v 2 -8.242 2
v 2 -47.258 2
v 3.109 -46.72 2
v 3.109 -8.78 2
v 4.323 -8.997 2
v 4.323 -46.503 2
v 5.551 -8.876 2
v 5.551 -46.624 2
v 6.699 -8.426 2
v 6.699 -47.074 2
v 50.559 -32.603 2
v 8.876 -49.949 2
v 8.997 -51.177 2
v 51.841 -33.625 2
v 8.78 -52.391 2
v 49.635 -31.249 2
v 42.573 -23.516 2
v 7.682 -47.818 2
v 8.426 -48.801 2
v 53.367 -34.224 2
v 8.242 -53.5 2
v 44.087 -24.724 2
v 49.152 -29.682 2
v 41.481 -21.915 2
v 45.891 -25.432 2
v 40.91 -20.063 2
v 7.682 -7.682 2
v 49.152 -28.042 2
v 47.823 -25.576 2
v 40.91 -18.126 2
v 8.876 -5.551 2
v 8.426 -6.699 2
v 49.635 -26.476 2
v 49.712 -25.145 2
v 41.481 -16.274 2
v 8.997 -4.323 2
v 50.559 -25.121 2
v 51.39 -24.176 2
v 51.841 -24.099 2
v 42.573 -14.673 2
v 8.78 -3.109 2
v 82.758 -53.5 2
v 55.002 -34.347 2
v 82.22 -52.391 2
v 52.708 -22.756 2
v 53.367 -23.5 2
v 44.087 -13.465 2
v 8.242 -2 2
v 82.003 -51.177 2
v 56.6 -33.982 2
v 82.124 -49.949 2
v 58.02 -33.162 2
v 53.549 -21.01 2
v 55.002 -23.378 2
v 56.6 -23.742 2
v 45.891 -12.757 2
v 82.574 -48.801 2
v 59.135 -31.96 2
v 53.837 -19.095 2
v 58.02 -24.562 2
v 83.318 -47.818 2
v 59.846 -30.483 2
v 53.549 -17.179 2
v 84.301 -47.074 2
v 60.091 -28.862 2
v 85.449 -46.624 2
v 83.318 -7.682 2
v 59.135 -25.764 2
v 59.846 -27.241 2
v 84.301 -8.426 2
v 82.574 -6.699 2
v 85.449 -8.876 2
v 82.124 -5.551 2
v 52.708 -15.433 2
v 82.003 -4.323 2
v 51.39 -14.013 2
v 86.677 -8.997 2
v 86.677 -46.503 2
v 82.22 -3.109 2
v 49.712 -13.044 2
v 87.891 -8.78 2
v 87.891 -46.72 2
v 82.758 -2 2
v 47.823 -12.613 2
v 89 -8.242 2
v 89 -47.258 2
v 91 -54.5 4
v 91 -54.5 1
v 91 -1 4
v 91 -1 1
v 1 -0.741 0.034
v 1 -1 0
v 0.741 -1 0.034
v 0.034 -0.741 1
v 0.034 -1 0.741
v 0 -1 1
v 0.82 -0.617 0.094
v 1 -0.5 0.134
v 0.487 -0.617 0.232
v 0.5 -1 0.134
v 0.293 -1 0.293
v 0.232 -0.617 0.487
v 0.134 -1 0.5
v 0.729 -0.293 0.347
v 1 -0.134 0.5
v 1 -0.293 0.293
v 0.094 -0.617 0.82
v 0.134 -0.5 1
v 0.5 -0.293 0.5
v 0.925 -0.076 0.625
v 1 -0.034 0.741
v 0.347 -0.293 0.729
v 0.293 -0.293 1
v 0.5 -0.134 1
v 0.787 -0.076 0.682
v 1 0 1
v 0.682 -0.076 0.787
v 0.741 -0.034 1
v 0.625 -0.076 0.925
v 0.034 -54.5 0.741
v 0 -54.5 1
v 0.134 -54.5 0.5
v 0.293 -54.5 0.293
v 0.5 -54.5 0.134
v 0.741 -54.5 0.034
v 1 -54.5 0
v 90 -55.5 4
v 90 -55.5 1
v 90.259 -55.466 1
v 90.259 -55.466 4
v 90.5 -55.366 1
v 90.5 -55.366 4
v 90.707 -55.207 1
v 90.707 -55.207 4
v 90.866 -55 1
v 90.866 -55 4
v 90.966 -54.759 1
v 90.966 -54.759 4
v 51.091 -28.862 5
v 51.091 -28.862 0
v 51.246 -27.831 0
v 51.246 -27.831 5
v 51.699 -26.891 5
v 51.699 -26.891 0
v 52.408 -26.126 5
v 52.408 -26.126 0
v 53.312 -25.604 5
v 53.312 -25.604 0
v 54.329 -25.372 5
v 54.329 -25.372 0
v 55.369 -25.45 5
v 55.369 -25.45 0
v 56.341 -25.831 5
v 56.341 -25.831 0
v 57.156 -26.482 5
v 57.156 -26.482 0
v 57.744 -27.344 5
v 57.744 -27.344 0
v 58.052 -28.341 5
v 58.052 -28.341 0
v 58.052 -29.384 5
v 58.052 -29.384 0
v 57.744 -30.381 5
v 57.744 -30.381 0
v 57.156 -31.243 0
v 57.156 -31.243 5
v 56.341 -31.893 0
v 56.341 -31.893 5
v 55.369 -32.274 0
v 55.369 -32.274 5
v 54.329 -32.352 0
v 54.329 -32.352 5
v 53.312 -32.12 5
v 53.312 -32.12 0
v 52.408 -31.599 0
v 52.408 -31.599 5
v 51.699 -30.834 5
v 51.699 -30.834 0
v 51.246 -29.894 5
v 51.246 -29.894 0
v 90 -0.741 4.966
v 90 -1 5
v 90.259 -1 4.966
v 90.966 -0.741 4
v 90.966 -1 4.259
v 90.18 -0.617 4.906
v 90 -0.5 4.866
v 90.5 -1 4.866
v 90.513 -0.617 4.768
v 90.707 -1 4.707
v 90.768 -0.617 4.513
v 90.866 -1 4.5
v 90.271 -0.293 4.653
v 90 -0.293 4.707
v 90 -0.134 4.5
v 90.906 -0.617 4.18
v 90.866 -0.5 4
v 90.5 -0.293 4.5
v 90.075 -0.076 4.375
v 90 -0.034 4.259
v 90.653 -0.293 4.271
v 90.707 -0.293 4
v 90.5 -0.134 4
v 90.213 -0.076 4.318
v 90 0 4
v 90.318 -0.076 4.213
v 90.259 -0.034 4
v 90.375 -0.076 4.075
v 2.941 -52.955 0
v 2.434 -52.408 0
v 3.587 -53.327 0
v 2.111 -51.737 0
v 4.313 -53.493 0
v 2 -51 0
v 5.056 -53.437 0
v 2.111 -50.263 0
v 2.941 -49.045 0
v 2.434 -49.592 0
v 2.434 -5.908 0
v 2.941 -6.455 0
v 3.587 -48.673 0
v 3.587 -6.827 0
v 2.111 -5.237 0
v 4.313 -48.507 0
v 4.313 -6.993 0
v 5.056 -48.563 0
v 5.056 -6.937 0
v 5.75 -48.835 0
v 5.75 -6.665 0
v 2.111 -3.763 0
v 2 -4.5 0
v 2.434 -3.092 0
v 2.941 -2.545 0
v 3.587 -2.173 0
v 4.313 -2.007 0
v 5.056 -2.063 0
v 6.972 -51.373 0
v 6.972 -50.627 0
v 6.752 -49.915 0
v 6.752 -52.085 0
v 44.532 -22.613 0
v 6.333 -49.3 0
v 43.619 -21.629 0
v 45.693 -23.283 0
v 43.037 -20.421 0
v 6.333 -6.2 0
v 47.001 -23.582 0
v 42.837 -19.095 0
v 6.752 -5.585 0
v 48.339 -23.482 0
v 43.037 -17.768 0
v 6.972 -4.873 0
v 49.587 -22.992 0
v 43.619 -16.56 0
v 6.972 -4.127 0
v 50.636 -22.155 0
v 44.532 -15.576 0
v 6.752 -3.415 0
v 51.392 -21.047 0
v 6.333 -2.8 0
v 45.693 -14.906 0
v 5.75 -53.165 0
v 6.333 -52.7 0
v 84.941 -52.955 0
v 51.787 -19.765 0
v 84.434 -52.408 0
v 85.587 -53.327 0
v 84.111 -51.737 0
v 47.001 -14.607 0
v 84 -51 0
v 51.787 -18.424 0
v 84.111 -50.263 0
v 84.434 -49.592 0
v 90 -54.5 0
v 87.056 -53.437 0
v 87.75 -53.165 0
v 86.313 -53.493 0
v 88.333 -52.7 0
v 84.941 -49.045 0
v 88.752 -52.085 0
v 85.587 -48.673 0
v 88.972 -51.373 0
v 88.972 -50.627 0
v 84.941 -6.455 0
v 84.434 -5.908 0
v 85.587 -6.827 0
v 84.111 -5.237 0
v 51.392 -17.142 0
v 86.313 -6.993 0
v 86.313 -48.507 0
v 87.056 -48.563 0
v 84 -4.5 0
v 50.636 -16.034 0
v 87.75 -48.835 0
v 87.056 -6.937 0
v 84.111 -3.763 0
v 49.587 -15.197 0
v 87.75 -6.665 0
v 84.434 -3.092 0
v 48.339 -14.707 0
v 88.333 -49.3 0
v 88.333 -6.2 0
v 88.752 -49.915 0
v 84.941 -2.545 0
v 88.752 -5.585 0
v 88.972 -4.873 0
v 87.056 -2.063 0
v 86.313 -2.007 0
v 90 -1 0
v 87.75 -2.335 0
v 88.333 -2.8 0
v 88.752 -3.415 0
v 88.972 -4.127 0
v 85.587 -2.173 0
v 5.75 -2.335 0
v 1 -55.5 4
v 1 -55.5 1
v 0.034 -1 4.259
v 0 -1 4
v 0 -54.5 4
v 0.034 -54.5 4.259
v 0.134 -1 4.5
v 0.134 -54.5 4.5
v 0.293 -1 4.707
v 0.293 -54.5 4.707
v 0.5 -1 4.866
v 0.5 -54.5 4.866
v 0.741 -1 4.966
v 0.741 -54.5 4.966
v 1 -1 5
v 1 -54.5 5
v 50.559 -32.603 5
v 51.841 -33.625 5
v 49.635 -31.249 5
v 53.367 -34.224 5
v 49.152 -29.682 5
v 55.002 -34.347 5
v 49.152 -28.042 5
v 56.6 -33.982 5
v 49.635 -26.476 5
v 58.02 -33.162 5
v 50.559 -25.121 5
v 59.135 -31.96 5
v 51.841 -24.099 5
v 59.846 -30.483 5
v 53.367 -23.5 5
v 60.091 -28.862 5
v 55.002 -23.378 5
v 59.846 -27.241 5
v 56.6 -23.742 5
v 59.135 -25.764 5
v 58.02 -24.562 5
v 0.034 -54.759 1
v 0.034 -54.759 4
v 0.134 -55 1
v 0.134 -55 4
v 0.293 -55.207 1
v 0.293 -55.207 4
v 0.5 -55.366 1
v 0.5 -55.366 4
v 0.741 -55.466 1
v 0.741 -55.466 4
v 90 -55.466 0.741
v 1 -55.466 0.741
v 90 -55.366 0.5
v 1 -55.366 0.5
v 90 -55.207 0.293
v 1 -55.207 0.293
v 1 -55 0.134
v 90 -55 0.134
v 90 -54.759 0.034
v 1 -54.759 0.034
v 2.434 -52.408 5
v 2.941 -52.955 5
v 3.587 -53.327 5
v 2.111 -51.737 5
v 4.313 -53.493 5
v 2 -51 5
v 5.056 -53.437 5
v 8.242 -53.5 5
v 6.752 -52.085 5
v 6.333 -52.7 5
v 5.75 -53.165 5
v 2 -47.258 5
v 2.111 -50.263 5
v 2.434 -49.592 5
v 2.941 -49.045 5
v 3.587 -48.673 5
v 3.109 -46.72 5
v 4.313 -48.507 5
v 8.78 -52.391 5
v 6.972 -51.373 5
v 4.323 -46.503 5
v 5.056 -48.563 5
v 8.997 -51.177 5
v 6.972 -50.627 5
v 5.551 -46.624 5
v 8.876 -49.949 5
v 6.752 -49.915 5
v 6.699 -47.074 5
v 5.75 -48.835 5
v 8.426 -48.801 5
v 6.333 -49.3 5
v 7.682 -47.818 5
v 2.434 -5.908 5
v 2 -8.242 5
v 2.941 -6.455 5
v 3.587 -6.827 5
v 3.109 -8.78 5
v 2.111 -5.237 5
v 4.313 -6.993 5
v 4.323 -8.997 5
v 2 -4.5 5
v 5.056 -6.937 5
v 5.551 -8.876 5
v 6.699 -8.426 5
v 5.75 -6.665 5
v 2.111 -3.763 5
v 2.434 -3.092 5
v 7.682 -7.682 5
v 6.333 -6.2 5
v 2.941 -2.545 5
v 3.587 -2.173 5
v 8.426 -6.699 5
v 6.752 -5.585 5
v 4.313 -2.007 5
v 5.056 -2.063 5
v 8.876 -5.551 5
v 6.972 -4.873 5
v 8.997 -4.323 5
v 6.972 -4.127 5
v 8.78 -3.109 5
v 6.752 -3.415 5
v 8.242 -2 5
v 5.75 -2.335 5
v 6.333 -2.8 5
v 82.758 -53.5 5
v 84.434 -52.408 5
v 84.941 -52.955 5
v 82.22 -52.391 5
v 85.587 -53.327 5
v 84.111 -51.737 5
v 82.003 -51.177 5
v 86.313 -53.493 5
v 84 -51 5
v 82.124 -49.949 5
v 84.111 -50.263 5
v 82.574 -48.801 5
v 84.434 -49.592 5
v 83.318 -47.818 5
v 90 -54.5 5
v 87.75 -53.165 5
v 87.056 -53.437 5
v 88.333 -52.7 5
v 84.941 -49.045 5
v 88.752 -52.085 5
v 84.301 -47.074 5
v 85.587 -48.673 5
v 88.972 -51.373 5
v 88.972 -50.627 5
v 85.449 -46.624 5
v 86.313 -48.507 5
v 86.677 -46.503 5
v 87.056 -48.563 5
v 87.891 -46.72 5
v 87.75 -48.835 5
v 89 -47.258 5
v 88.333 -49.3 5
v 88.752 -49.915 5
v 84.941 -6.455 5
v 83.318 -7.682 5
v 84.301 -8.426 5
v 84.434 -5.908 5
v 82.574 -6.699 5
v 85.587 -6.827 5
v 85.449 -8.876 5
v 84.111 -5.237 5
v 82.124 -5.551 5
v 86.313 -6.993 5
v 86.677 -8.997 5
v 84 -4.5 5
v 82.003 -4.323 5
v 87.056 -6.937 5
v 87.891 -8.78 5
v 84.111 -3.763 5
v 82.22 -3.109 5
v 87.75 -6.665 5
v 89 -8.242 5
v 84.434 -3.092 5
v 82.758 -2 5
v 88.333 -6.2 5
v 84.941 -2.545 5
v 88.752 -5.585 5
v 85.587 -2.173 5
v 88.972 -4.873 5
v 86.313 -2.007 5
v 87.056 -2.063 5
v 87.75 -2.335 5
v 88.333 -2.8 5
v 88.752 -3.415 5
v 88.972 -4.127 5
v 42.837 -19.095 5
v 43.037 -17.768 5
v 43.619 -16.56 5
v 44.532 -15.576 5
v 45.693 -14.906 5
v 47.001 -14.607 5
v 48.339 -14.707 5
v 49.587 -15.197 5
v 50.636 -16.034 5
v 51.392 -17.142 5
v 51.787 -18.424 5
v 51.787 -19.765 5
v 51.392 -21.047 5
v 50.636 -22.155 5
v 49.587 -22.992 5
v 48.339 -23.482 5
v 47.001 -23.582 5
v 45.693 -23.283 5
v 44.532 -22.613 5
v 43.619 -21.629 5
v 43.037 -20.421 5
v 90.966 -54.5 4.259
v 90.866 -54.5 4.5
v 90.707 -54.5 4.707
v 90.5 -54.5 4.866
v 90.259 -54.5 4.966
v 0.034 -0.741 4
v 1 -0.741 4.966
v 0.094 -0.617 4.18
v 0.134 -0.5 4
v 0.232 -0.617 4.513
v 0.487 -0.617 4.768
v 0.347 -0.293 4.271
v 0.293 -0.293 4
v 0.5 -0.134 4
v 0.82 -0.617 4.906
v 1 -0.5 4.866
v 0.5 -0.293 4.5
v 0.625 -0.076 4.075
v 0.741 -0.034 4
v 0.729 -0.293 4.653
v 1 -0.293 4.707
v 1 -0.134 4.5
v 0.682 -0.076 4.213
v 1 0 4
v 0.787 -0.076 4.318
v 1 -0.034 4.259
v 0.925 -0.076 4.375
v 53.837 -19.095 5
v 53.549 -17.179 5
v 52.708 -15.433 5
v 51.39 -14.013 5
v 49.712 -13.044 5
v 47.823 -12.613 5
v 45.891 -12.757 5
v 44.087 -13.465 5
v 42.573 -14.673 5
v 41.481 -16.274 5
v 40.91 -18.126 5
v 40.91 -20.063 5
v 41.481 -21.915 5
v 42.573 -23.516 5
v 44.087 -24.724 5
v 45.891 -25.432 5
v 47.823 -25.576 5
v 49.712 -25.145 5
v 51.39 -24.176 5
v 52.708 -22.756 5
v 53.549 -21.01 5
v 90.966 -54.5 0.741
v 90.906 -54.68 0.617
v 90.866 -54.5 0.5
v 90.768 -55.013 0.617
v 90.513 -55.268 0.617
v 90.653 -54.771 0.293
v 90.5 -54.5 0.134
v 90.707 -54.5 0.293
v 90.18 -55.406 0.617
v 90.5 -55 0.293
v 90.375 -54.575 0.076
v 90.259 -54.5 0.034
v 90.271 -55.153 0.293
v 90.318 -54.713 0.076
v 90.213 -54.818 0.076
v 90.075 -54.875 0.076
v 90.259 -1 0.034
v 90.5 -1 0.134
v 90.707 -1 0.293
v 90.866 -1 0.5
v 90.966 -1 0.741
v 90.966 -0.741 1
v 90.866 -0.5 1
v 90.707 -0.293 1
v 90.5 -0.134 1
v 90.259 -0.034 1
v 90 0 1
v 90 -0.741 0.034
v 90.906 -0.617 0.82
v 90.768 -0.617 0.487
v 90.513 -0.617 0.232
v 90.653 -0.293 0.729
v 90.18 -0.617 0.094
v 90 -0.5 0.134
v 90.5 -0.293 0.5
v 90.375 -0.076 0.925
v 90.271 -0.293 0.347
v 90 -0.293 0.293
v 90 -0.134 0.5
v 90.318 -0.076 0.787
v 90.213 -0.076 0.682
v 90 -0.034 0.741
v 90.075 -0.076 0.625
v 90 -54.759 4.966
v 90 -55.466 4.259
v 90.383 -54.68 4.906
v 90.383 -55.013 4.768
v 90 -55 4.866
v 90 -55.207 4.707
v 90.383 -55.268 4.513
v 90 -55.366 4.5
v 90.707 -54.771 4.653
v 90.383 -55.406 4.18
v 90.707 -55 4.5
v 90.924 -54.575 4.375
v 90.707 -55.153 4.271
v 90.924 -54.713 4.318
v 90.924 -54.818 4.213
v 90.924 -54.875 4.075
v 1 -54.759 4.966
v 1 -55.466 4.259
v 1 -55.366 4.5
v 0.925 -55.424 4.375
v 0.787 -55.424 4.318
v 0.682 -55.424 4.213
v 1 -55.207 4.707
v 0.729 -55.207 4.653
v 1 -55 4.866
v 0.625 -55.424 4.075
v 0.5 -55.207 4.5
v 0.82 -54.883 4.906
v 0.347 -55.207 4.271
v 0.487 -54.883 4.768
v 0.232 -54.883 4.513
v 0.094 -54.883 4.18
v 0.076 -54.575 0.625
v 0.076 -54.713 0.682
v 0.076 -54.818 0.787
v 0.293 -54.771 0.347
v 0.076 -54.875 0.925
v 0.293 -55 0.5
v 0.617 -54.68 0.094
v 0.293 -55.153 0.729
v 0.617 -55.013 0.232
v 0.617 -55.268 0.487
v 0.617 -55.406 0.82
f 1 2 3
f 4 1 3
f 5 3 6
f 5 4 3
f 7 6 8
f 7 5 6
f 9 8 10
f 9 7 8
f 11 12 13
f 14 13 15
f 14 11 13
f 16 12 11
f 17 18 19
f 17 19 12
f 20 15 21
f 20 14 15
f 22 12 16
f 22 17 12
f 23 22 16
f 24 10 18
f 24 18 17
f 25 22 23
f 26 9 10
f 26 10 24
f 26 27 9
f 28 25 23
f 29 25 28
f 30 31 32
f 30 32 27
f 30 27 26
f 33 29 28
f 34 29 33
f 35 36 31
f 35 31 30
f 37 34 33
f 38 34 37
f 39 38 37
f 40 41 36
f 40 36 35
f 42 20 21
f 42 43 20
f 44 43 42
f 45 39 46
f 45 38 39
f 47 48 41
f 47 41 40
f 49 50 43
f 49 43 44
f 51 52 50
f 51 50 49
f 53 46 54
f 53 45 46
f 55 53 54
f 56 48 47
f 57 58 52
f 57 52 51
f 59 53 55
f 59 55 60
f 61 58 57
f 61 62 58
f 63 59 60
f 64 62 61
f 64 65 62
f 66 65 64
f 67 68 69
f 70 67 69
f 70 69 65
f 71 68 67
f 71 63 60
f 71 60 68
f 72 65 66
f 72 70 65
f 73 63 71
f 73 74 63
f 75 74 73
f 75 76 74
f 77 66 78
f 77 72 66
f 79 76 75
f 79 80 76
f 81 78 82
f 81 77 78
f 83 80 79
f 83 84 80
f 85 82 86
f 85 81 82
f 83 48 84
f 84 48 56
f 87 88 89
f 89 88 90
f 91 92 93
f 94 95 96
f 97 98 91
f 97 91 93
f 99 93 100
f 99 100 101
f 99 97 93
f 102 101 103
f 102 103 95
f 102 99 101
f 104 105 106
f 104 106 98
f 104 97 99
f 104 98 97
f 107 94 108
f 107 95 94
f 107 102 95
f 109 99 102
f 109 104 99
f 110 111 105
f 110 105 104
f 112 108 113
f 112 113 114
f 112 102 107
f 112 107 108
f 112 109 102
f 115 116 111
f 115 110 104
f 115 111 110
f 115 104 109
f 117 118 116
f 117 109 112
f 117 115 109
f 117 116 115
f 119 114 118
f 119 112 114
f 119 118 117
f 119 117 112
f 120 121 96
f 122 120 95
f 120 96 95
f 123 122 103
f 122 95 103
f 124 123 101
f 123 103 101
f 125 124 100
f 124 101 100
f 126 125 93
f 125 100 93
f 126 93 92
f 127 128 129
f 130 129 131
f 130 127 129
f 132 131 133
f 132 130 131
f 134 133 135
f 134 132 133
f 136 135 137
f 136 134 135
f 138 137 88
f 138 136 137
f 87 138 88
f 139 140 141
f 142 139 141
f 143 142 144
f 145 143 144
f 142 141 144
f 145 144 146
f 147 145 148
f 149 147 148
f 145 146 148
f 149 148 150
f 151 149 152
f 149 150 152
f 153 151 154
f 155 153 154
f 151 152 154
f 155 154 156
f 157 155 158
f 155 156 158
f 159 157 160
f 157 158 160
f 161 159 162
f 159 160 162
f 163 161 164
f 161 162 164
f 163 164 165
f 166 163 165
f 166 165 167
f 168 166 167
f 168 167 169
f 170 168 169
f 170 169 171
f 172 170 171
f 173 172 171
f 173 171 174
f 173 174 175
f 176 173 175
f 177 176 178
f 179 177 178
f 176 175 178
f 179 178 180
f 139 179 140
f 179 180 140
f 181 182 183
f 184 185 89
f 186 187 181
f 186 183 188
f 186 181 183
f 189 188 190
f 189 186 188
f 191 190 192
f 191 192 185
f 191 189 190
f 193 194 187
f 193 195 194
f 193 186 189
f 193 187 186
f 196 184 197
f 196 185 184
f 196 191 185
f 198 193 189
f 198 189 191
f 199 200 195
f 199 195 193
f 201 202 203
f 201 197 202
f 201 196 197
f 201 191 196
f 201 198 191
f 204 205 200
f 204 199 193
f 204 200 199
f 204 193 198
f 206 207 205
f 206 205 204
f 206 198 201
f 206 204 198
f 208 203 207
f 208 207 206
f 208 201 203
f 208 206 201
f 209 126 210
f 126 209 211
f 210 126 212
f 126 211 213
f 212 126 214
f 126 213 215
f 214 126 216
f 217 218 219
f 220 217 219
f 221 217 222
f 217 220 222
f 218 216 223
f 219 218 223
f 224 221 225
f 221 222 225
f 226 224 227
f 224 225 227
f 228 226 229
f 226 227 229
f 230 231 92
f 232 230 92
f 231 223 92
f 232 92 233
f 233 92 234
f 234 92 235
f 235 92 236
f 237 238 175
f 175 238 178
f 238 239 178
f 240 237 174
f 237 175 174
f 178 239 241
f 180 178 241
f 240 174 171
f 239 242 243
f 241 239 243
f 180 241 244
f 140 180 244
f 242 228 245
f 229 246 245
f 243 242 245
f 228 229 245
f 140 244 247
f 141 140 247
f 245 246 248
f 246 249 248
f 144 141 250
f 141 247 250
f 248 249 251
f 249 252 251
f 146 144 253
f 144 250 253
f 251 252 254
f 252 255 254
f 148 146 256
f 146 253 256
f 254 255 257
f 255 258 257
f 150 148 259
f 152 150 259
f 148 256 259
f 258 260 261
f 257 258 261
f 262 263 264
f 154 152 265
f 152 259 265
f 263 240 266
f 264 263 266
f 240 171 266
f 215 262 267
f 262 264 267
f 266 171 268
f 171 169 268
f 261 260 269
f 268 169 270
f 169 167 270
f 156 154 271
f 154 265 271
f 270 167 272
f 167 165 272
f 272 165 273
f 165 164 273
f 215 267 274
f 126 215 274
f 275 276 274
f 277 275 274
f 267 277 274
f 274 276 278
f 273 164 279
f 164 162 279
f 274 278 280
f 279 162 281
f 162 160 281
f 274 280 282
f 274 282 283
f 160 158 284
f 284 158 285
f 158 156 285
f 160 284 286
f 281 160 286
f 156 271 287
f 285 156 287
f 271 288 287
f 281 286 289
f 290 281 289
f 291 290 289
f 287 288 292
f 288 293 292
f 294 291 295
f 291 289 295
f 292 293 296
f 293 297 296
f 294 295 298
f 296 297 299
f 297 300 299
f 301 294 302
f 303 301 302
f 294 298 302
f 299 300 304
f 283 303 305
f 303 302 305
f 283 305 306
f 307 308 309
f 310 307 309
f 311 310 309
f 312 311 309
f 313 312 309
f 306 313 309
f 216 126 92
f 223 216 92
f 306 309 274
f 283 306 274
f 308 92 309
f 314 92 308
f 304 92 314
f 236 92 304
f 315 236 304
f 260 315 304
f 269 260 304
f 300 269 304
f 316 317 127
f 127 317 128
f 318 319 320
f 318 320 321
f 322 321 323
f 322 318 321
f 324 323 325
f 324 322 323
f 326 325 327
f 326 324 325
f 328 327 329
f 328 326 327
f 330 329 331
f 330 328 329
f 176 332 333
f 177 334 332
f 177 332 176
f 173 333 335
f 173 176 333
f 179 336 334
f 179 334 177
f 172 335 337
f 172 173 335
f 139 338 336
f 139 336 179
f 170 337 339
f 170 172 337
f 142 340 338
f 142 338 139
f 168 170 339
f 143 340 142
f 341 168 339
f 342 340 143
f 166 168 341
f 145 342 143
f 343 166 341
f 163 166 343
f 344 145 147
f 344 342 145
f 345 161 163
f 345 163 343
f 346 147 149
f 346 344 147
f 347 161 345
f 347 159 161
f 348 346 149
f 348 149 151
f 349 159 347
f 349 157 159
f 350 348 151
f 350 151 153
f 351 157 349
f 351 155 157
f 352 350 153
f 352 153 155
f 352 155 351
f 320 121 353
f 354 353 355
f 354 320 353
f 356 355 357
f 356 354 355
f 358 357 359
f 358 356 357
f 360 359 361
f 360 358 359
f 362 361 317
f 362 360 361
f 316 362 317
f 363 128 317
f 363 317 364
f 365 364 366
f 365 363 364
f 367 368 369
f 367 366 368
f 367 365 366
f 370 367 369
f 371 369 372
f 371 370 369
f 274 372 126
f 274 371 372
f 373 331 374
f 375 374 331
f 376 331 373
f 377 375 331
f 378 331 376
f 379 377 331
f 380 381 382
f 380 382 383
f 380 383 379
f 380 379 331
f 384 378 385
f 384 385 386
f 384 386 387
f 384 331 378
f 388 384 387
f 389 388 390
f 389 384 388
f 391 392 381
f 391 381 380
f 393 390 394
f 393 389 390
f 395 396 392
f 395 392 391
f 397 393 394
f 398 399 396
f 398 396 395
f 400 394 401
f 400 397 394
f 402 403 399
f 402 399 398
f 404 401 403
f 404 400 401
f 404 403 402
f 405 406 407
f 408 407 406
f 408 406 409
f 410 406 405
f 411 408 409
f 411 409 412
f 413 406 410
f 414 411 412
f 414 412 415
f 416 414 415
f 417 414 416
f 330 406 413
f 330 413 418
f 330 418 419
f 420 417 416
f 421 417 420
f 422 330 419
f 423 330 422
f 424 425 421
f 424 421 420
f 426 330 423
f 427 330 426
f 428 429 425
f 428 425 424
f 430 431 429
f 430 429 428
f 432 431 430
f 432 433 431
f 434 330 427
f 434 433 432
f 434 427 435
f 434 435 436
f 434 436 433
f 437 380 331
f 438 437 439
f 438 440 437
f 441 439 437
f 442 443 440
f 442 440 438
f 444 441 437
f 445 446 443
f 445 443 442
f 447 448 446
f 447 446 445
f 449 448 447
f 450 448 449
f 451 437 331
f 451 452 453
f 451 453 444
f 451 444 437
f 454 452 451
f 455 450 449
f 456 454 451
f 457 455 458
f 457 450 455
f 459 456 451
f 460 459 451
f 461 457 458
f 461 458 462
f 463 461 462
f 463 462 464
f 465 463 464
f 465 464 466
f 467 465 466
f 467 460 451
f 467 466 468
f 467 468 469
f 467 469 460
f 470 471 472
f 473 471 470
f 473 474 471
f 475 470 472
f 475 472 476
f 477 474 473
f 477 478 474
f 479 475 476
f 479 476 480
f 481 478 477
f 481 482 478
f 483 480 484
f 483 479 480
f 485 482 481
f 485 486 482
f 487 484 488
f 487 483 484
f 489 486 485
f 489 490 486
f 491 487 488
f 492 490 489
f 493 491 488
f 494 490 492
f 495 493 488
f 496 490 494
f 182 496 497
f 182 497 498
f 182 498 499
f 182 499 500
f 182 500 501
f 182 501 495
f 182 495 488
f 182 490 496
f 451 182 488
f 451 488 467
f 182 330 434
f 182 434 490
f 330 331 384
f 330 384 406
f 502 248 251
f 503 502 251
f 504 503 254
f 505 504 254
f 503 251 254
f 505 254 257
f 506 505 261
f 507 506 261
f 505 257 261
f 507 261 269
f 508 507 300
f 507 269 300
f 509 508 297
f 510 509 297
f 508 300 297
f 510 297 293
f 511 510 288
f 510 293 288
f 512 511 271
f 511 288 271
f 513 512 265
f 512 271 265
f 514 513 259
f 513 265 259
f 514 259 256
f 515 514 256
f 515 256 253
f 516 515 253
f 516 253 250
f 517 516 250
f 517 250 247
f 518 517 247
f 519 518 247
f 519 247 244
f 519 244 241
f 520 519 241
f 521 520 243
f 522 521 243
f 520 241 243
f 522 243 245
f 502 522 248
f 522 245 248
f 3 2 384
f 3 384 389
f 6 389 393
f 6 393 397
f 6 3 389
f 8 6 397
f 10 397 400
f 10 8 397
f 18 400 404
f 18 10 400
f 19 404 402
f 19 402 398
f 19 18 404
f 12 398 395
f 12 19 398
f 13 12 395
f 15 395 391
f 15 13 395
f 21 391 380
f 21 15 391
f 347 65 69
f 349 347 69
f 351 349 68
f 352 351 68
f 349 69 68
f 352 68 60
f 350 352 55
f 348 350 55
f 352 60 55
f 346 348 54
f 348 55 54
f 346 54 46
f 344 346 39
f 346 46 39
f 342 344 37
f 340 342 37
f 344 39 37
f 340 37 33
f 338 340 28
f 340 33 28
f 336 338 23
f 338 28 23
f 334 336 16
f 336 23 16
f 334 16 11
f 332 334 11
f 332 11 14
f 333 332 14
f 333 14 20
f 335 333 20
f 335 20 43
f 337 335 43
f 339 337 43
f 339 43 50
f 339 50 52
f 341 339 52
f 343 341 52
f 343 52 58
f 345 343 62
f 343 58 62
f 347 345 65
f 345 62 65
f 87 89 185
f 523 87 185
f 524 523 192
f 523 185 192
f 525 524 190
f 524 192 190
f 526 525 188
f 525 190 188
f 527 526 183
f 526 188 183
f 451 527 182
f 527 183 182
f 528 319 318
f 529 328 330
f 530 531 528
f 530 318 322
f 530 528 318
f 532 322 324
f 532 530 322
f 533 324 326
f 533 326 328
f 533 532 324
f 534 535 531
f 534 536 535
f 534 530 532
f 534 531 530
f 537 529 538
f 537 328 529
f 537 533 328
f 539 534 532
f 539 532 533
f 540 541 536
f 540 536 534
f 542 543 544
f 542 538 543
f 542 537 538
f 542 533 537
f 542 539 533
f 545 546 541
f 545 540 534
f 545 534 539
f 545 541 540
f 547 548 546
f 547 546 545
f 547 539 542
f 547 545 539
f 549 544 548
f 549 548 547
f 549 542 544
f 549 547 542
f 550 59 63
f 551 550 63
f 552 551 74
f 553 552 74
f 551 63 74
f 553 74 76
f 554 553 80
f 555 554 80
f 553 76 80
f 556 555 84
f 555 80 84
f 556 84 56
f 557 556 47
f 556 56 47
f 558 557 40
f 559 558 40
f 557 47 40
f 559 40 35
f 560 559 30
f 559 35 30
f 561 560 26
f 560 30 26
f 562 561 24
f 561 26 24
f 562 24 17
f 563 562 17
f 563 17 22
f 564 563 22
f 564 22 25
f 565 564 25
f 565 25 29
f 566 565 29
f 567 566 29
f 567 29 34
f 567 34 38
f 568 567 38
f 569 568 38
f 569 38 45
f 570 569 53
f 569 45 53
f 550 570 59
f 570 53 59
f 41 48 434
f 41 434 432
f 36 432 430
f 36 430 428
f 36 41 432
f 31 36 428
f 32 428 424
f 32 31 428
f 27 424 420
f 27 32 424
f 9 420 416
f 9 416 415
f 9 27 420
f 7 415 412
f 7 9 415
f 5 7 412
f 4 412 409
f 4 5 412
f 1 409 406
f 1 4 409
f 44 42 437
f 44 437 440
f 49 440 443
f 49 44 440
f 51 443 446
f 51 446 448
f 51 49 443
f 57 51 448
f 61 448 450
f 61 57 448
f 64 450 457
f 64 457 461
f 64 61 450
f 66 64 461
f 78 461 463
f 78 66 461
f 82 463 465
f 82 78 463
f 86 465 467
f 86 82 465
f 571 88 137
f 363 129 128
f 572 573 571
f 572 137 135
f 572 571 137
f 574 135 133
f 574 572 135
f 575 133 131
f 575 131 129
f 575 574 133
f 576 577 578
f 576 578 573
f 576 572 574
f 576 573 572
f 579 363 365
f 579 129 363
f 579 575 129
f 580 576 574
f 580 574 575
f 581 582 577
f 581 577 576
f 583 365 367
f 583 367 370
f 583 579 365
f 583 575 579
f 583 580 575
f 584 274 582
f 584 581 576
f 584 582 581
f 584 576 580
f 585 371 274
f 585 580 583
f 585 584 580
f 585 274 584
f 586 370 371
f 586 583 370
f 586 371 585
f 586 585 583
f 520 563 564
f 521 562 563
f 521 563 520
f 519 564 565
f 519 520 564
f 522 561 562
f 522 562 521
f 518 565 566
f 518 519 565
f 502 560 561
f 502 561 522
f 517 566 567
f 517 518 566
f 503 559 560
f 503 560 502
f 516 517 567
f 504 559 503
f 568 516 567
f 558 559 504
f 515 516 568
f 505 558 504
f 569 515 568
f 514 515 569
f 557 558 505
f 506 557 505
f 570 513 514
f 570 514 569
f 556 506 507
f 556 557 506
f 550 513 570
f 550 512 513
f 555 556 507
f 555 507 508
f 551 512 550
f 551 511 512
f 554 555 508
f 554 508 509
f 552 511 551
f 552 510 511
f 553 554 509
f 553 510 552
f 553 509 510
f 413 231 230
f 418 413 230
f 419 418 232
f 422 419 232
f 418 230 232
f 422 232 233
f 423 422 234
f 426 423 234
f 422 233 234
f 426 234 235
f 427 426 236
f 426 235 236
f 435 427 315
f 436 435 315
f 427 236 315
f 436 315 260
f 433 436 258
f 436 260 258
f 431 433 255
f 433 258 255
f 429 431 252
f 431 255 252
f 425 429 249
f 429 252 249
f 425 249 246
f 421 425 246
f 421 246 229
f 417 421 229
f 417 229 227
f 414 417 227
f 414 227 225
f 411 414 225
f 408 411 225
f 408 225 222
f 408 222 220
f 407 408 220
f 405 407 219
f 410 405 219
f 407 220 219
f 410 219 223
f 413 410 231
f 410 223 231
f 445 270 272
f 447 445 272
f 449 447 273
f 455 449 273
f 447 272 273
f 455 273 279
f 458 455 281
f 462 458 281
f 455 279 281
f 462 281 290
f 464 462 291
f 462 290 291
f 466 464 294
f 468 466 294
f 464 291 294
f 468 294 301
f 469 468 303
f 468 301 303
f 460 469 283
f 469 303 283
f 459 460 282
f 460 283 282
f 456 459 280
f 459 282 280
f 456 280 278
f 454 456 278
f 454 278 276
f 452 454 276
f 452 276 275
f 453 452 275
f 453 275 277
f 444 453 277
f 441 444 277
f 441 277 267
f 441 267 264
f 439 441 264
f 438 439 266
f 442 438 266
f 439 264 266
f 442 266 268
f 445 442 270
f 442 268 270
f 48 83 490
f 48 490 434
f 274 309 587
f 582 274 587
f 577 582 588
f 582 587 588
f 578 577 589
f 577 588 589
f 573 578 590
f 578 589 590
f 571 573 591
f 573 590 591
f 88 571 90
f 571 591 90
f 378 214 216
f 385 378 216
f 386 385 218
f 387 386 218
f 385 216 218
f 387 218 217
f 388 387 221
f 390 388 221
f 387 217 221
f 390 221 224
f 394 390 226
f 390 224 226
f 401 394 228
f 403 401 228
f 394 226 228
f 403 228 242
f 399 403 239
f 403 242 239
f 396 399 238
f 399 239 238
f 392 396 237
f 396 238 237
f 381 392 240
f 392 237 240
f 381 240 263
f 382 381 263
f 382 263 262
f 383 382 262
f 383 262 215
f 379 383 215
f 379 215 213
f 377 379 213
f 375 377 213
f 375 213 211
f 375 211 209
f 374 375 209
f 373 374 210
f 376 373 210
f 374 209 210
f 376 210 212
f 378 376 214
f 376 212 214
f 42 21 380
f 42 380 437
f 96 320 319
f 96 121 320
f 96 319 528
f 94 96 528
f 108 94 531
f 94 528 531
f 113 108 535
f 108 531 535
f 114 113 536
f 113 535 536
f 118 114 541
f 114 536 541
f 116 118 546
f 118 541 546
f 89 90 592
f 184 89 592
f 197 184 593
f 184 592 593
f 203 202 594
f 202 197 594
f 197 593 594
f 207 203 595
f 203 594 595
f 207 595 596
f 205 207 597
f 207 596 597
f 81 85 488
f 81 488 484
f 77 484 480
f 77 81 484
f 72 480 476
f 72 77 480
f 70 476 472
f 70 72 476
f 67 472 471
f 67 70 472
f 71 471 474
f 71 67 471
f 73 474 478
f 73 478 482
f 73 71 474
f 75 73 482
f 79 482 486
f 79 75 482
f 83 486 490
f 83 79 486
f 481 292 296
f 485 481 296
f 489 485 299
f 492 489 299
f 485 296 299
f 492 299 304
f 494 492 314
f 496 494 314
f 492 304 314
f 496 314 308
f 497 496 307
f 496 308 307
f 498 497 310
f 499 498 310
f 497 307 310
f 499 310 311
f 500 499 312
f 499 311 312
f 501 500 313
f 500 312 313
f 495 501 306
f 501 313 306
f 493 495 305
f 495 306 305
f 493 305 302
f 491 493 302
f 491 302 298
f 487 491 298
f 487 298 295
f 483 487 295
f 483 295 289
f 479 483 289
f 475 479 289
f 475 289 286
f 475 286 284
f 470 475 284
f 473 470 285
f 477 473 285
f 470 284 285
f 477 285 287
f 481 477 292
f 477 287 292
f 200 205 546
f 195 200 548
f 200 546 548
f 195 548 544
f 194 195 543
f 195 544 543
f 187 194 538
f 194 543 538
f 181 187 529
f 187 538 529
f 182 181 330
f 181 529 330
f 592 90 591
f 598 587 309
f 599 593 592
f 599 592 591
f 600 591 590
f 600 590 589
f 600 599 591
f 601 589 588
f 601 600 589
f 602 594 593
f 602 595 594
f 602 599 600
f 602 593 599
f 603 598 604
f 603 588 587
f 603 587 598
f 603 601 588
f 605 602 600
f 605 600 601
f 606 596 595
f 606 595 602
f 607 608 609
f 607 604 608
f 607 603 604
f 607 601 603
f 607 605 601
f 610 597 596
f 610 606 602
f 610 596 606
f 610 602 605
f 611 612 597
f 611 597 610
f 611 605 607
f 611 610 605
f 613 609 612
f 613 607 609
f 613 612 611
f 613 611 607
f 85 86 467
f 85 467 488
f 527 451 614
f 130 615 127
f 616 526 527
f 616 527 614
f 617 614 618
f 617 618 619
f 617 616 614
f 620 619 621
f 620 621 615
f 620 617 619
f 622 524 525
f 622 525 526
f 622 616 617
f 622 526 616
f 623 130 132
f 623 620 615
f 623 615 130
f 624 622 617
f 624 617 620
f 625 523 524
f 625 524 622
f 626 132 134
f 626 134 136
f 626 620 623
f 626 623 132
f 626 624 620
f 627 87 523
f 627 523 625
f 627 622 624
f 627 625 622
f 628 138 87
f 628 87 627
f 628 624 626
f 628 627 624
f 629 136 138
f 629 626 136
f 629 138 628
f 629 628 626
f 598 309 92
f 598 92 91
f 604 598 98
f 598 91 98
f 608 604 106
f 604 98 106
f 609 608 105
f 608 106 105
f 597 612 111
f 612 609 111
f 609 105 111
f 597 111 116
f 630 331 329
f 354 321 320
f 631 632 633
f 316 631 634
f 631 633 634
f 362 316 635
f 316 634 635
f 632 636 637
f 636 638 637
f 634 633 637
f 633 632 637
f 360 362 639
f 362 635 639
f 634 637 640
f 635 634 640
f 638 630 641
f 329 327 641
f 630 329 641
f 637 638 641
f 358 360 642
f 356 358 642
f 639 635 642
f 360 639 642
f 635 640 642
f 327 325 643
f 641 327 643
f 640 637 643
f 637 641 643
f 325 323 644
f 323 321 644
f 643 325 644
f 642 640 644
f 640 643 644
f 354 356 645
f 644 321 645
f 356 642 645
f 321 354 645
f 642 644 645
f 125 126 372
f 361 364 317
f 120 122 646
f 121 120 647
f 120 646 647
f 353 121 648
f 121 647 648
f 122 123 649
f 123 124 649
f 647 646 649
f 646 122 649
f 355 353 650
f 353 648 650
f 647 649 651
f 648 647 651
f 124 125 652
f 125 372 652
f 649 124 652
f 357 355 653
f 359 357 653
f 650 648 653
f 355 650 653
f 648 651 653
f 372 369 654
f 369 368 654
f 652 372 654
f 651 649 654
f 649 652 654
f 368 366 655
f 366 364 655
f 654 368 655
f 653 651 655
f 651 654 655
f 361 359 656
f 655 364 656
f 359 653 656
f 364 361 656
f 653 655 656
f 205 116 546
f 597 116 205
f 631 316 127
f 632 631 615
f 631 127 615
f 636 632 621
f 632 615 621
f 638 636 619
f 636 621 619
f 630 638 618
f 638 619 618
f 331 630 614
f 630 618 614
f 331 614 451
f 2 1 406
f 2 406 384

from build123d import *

# Parameters (mm, degrees)
SKETCH1_W           = 91
SKETCH1_H           = 55.5
BOSS_EXTRUDE1_DEPTH = 5
FILLET1_R           = 1
FILLET2_R           = 1
SKETCH3_R           = 2.5
SKETCH3_R_2         = 4.5
SKETCH3_R_3         = 3.5
CUT_EXTRUDE6_DEPTH  = 5
SHELL3_START        = 2
SHELL3_OUTLINE_R    = 5.5
SHELL3_OUTLINE_R_2  = 6.5
SHELL3_DEPTH        = 3


# Read off the part's stored shape, not the designer's step: Shell3
with BuildPart() as part:
    # Sketch1 → Boss-Extrude1 (new body)
    with BuildSketch(Plane.XY):
        with Locations((45.5, -27.75)):
            Rectangle(SKETCH1_W, SKETCH1_H)
    extrude(amount=BOSS_EXTRUDE1_DEPTH)

    # Fillet1
    fillet1_edges = [part.edges().sort_by_distance(p)[0] for p in [
        (0, -27.75, 5),
        (45.5, -55.5, 0),
        (0, -27.75, 0),
        (45.5, -55.5, 5),
        (0, 0, 2.5),
        (91, -55.5, 2.5),
        (0, -55.5, 2.5),
    ]]
    fillet(fillet1_edges, radius=FILLET1_R)

    # Fillet2
    # the kernel refuses this fillet: 1 mm, written as the material it takes off along each edge
    with BuildSketch(Plane(origin=(90, -54.5, 4), x_dir=(0, 0, 1), z_dir=(1, 0, 0))) as fillet2_piece_1_section:
        Polygon((0, 0), (FILLET2_R, 0), (FILLET2_R, FILLET2_R), (0, FILLET2_R), align=None)
    fillet2_piece_1 = extrude(amount=FILLET2_R, mode=Mode.PRIVATE)
    fillet2_piece_1 = fillet2_piece_1 - Plane(origin=(90, -54.5, 4), x_dir=(0, 0.7071067811865475, -0.7071067811865475), z_dir=(1, 0, 0)) * Sphere(FILLET2_R, mode=Mode.PRIVATE)
    add(fillet2_piece_1, mode=Mode.SUBTRACT)
    with BuildSketch(Plane(origin=(90, -54.5, 1), x_dir=(1, 0, 0), z_dir=(0, 0, -1))) as fillet2_piece_2_section:
        Polygon((0, 0), (FILLET2_R, 0), (FILLET2_R, FILLET2_R), (0, FILLET2_R), align=None)
    fillet2_piece_2 = extrude(amount=FILLET2_R, mode=Mode.PRIVATE)
    fillet2_piece_2 = fillet2_piece_2 - Plane(origin=(90, -54.5, 1), x_dir=(-0.7071067811865476, 0.7071067811865475, 0), z_dir=(0, 0, -1)) * Sphere(FILLET2_R, mode=Mode.PRIVATE)
    add(fillet2_piece_2, mode=Mode.SUBTRACT)
    with BuildSketch(Plane(origin=(1, -1, 4), x_dir=(0, 0, 1), z_dir=(0, 1, 0))) as fillet2_piece_3_section:
        Polygon((0, 0), (FILLET2_R, 0), (FILLET2_R, -FILLET2_R), (0, -FILLET2_R), align=None)
    fillet2_piece_3 = extrude(amount=FILLET2_R, mode=Mode.PRIVATE)
    fillet2_piece_3 = fillet2_piece_3 - Plane(origin=(1, -1, 4), x_dir=(0.7071067811865475, 0, -0.7071067811865475), z_dir=(0, 1, 0)) * Sphere(FILLET2_R, mode=Mode.PRIVATE)
    add(fillet2_piece_3, mode=Mode.SUBTRACT)
    with BuildSketch(Plane(origin=(1, -1, 1), x_dir=(0, 0, -1), z_dir=(0, 1, 0))) as fillet2_piece_4_section:
        Polygon((0, 0), (FILLET2_R, 0), (FILLET2_R, FILLET2_R), (0, FILLET2_R), align=None)
    fillet2_piece_4 = extrude(amount=FILLET2_R, mode=Mode.PRIVATE)
    fillet2_piece_4 = fillet2_piece_4 - Plane(origin=(1, -1, 1), x_dir=(0.7071067811865475, 0, 0.7071067811865475), z_dir=(0, 1, 0)) * Sphere(FILLET2_R, mode=Mode.PRIVATE)
    add(fillet2_piece_4, mode=Mode.SUBTRACT)
    with BuildSketch(Plane(origin=(90, -1, 4), x_dir=(1, 0, 0), z_dir=(0, 1, 0))) as fillet2_piece_5_section:
        Polygon((0, 0), (FILLET2_R, 0), (FILLET2_R, -FILLET2_R), (0, -FILLET2_R), align=None)
    fillet2_piece_5 = extrude(amount=FILLET2_R, mode=Mode.PRIVATE)
    fillet2_piece_5 = fillet2_piece_5 - Plane(origin=(90, -1, 4), x_dir=(-0.7071067811865475, 0, -0.7071067811865475), z_dir=(0, 1, 0)) * Sphere(FILLET2_R, mode=Mode.PRIVATE)
    add(fillet2_piece_5, mode=Mode.SUBTRACT)
    with BuildSketch(Plane(origin=(90, -1, 1), x_dir=(0, 0, -1), z_dir=(0, 1, 0))) as fillet2_piece_6_section:
        Polygon((0, 0), (FILLET2_R, 0), (FILLET2_R, -FILLET2_R), (0, -FILLET2_R), align=None)
    fillet2_piece_6 = extrude(amount=FILLET2_R, mode=Mode.PRIVATE)
    fillet2_piece_6 = fillet2_piece_6 - Plane(origin=(90, -1, 1), x_dir=(-0.7071067811865475, 0, 0.7071067811865475), z_dir=(0, 1, 0)) * Sphere(FILLET2_R, mode=Mode.PRIVATE)
    add(fillet2_piece_6, mode=Mode.SUBTRACT)
    with BuildSketch(Plane(origin=(91, -1, 5), x_dir=(0, 0, -1), z_dir=(0, -1, 0)), Plane(origin=(91, -1, 0), x_dir=(-1, 0, 0), z_dir=(0, -1, 0))) as fillet2_piece_7:
        with BuildLine():
            CenterArc((FILLET2_R, -FILLET2_R), FILLET2_R, 90, 90)
            Line((0, -FILLET2_R), (0, 0))
            Line((0, 0), (FILLET2_R, 0))
        make_face()
    extrude(amount=53.5, mode=Mode.SUBTRACT)
    with BuildSketch(Plane(origin=(1, 0, 0), x_dir=(0, 0, 1), z_dir=(1, 0, 0))) as fillet2_piece_8:
        with BuildLine():
            CenterArc((FILLET2_R, FILLET2_R), FILLET2_R, 180, 90)
            Line((0, FILLET2_R), (0, 0))
            Line((0, 0), (FILLET2_R, 0))
        make_face()
    extrude(amount=89, mode=Mode.SUBTRACT)
    with BuildSketch(Plane(origin=(1, 0, 5), x_dir=(0, 0, -1), z_dir=(1, 0, 0))) as fillet2_piece_9:
        with BuildLine():
            CenterArc((FILLET2_R, -FILLET2_R), FILLET2_R, 90, 90)
            Line((0, -FILLET2_R), (0, 0))
            Line((0, 0), (FILLET2_R, 0))
        make_face()
    extrude(amount=89, mode=Mode.SUBTRACT)
    with BuildSketch(Plane(origin=(91, 0, 1), x_dir=(-1, 0, 0), z_dir=(0, 0, 1))) as fillet2_piece_10:
        with BuildLine():
            CenterArc((FILLET2_R, FILLET2_R), FILLET2_R, 180, 90)
            Line((0, FILLET2_R), (0, 0))
            Line((0, 0), (FILLET2_R, 0))
        make_face()
    extrude(amount=3, mode=Mode.SUBTRACT)

    # Sketch3 → Cut-Extrude6 (cut)
    with BuildSketch(Plane(origin=(0, 0, 0), x_dir=(-1, 0, 0), z_dir=(0, 0, -1))):
        with Locations((-4.5, -51)):
            Circle(SKETCH3_R)
        with Locations((-47.337477188, -19.094515349)):
            Circle(SKETCH3_R_2)
        with Locations((-4.5, -4.5)):
            Circle(SKETCH3_R)
        with Locations((-54.590676617, -28.862157246)):
            Circle(SKETCH3_R_3)
        with Locations((-86.5, -4.5)):
            Circle(SKETCH3_R)
        with Locations((-86.5, -51)):
            Circle(SKETCH3_R)
    extrude(amount=-CUT_EXTRUDE6_DEPTH, mode=Mode.SUBTRACT)

    # Shell3 outline → Shell3 (cut)
    with BuildSketch(Plane.XY.offset(SHELL3_START)):
        with BuildLine():
            Line((2, -8.241657387), (2, -47.258342613))
            ThreePointArc((2, -47.258342613), (7.681980515, -47.818019485), (8.241657387, -53.5))
            Line((8.241657387, -53.5), (82.758342613, -53.5))
            ThreePointArc((82.758342613, -53.5), (83.318019485, -47.818019485), (89, -47.258342613))
            Line((89, -47.258342613), (89, -8.241657387))
            ThreePointArc((89, -8.241657387), (83.318019485, -7.681980515), (82.758342613, -2))
            Line((82.758342613, -2), (8.241657387, -2))
            ThreePointArc((8.241657387, -2), (7.681980515, -7.681980515), (2, -8.241657387))
        make_face()
        with Locations((54.590676617, -28.862157246)):
            Circle(SHELL3_OUTLINE_R, mode=Mode.SUBTRACT)
        with Locations((47.337477188, -19.094515349)):
            Circle(SHELL3_OUTLINE_R_2, mode=Mode.SUBTRACT)
    extrude(amount=SHELL3_DEPTH, mode=Mode.SUBTRACT)


solid = part.part
